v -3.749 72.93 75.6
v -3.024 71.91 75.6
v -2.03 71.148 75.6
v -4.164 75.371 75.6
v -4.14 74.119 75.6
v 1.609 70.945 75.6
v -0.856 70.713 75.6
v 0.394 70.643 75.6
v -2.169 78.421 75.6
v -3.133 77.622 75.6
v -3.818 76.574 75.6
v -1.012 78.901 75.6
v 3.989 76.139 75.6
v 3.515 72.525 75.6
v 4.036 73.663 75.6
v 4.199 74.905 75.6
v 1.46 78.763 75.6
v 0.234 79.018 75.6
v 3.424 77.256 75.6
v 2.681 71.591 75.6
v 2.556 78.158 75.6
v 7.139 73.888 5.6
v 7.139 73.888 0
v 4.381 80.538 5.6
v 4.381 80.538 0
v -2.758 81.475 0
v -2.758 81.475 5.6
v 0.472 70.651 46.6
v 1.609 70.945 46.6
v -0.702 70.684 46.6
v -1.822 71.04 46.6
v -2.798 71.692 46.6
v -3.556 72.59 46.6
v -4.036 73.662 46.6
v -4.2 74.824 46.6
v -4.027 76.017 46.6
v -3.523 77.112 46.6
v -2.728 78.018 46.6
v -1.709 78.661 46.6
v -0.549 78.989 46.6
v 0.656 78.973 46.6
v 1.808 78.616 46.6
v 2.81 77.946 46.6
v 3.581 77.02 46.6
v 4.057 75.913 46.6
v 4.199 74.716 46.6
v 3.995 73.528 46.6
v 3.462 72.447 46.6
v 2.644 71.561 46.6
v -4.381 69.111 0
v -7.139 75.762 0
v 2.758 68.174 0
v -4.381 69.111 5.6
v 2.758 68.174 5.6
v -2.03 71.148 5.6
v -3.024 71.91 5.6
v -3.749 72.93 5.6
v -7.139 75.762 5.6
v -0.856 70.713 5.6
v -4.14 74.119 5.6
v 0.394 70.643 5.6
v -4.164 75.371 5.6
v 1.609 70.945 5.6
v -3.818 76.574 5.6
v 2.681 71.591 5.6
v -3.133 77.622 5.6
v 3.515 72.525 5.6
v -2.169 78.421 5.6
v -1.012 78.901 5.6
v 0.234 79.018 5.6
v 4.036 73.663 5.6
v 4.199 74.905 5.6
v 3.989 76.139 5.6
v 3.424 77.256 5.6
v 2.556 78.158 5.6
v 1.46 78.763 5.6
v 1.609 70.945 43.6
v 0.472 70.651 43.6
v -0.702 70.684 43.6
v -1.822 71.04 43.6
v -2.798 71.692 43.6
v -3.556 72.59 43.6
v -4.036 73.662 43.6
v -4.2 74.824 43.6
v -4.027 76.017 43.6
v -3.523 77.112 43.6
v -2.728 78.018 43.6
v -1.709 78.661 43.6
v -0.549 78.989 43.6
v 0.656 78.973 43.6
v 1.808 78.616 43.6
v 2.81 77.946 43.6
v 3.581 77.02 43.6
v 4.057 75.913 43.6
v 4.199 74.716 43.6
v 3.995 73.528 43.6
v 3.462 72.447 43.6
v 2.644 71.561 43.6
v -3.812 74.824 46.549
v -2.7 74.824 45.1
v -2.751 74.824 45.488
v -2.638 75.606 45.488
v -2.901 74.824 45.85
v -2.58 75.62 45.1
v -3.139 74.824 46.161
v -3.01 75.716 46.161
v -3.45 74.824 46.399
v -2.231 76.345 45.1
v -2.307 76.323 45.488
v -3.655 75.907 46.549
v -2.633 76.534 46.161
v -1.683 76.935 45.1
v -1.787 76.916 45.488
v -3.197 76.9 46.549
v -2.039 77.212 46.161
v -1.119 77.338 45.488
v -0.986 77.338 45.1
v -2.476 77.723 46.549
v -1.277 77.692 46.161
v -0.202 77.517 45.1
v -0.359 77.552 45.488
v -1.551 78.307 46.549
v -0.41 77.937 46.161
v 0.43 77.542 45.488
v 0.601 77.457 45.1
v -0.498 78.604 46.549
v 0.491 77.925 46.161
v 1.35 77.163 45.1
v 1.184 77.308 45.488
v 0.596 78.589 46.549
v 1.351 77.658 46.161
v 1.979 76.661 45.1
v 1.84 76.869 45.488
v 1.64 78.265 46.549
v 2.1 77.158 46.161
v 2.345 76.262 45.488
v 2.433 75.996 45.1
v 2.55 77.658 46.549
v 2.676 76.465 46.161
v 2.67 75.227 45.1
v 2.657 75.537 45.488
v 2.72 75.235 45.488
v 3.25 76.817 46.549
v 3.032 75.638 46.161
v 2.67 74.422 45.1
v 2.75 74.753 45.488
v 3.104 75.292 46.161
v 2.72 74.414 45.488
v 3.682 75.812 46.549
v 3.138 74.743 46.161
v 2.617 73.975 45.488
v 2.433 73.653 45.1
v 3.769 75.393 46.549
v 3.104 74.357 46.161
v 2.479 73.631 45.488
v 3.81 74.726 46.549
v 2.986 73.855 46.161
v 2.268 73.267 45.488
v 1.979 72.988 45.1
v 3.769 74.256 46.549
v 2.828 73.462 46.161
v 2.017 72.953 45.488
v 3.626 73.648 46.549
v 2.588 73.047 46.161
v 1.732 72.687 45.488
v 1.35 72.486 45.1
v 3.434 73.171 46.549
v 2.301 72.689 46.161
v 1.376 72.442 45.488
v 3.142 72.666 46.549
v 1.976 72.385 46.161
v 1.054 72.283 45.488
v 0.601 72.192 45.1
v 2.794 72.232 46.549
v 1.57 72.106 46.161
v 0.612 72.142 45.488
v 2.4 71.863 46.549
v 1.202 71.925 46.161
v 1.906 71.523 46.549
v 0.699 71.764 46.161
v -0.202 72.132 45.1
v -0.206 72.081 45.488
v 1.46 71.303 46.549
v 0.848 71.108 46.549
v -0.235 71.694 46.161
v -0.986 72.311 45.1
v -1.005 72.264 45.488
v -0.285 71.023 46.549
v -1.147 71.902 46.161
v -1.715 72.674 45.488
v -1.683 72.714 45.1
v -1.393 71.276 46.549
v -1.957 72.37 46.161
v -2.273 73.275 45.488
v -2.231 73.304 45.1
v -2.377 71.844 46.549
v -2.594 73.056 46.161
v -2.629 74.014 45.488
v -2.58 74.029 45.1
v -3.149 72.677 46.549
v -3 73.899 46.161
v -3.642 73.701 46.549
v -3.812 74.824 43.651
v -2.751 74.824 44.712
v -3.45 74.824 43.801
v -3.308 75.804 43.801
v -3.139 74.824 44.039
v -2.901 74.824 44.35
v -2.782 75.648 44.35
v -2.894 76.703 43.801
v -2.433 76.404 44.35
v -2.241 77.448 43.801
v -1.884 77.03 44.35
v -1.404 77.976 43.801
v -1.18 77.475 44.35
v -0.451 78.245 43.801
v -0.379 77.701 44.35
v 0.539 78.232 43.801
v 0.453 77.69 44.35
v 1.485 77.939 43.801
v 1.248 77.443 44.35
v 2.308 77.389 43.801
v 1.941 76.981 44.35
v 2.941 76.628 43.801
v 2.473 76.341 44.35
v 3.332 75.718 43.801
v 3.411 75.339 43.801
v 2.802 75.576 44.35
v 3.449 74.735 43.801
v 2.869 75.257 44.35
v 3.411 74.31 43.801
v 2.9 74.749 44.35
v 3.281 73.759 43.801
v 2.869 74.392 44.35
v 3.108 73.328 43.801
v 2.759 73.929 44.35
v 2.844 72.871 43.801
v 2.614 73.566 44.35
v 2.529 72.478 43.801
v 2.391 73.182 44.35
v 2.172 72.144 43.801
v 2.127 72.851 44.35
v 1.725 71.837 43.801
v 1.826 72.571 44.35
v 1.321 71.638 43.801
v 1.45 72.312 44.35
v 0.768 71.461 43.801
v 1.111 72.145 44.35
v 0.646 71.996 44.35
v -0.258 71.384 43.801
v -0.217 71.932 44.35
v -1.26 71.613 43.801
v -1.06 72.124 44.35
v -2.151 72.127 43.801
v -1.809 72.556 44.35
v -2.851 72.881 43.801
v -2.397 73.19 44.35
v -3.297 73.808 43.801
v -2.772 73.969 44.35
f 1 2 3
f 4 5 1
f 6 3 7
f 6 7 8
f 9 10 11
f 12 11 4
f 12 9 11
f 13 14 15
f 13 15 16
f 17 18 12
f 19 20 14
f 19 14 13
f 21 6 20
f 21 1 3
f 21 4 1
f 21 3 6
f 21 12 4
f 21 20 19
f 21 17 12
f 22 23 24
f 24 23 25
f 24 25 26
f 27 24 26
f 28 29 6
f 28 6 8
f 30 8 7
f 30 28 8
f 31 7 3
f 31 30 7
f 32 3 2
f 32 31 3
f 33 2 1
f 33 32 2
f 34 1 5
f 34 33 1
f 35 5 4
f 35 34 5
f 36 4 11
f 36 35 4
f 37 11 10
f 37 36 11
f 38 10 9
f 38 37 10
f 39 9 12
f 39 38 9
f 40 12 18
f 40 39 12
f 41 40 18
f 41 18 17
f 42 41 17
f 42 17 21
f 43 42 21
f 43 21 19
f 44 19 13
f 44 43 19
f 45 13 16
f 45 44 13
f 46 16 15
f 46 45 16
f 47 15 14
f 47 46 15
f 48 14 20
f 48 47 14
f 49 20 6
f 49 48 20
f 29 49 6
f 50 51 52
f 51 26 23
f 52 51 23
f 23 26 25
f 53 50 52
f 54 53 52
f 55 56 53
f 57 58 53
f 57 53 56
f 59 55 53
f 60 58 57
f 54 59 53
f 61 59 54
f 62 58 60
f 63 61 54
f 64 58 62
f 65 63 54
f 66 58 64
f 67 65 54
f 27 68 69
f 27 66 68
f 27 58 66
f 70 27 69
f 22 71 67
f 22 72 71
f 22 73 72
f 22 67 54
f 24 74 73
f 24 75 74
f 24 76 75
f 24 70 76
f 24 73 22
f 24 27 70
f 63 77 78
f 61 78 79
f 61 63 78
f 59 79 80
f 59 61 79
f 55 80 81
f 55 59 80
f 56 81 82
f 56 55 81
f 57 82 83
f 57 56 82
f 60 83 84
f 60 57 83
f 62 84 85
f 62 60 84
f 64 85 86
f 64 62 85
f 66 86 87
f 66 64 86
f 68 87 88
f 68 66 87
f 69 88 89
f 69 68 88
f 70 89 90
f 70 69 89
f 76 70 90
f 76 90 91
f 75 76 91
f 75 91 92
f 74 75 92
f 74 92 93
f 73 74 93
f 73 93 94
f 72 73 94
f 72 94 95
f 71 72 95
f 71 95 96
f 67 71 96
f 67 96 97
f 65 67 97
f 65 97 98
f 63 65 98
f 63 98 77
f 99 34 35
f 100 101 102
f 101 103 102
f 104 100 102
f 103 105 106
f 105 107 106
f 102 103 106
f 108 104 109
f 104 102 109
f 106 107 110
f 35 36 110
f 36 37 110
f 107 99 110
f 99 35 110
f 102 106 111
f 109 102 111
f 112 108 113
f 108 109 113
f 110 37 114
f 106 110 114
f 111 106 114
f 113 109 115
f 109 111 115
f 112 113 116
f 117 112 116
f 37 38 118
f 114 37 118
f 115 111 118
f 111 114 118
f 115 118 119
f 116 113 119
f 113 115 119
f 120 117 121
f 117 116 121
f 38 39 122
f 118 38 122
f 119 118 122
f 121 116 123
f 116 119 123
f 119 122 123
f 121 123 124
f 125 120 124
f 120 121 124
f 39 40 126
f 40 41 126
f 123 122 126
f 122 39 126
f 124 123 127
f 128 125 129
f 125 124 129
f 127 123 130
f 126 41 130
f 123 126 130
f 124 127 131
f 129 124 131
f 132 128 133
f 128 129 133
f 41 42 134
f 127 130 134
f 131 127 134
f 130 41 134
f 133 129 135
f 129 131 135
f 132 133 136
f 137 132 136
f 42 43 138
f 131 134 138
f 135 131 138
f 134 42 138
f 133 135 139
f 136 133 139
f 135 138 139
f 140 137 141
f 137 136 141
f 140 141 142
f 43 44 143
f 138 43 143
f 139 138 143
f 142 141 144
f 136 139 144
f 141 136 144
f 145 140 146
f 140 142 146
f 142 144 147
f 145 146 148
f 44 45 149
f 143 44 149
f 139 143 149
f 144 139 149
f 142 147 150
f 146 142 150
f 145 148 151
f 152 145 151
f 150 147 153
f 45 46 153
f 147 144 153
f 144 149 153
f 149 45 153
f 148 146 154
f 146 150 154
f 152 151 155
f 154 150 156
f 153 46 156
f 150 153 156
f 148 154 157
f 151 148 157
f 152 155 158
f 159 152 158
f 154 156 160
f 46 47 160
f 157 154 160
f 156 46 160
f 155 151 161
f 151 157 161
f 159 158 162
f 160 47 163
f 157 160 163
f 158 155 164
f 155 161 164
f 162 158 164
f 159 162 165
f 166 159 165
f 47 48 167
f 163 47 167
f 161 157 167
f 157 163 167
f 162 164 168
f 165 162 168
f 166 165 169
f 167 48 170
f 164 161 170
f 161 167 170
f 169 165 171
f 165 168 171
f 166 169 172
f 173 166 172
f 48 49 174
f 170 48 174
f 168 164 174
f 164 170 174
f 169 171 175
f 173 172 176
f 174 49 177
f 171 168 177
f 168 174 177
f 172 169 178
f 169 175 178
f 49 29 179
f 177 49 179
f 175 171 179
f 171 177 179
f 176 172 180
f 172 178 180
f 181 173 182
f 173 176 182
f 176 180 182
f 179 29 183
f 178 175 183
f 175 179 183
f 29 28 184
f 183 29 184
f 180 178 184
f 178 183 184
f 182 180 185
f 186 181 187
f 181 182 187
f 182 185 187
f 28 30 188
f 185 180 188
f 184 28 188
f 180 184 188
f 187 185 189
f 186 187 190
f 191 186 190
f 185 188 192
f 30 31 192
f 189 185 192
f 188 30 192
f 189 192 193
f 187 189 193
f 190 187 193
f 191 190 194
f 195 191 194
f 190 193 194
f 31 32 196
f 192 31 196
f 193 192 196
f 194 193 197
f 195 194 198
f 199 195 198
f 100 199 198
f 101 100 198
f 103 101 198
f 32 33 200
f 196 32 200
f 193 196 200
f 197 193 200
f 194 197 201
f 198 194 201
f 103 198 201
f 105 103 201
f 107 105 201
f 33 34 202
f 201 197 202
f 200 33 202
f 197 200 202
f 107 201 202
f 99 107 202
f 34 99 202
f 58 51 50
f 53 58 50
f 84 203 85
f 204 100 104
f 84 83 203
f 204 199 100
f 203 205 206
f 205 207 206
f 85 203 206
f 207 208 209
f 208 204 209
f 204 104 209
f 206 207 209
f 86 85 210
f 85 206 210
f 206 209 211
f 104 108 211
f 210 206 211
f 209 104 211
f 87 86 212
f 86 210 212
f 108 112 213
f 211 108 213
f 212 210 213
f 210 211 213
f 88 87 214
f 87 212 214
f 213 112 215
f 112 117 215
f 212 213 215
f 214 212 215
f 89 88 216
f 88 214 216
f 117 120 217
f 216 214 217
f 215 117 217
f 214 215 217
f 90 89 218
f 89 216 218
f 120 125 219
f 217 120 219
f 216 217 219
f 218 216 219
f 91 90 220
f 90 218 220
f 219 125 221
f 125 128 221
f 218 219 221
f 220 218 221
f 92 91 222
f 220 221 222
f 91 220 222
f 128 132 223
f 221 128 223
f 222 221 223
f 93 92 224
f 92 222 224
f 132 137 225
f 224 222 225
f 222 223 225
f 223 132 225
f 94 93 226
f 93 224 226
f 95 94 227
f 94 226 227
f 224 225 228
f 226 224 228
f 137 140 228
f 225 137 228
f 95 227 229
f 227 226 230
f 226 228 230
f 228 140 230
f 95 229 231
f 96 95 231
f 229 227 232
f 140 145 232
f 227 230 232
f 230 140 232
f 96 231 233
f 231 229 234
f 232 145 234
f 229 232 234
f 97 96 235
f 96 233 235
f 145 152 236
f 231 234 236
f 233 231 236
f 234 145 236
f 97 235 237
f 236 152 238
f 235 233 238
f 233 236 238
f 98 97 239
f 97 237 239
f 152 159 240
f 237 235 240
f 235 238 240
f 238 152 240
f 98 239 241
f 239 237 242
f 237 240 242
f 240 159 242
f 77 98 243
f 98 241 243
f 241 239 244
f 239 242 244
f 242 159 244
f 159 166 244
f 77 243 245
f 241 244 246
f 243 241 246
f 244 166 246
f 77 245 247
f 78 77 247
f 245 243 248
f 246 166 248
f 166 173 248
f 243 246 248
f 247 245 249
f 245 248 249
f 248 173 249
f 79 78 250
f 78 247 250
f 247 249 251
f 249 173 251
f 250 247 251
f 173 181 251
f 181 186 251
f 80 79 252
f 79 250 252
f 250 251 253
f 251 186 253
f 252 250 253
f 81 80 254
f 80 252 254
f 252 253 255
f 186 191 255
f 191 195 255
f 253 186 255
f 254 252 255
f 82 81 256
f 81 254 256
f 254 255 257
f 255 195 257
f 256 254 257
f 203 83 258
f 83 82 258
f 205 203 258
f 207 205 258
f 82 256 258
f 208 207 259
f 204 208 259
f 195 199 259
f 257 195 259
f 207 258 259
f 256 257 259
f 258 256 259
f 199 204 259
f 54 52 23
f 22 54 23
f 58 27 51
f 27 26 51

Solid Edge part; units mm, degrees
sketch "Sketch1" plane through (0, 0, 0) normal (0, 0, 1) x (1, 0, 0)
  line L0 (-2.7579, 81.4753) -> (-7.1387, 75.7615)
  line L1 (-7.1387, 75.7615) -> (-4.3808, 69.1106)
  line L2 (-4.3808, 69.1106) -> (2.7579, 68.1737)
  line L3 (2.7579, 68.1737) -> (7.1387, 73.8875)
  line L4 (7.1387, 73.8875) -> (4.3808, 80.5384)
  line L5 (4.3808, 80.5384) -> (-2.7579, 81.4753)
extrude "Protrusion1" add sketch "Sketch1" along normal up to vertex (5.6 mm away)
sketch "Sketch2" plane through (0, 74.8245, 5.6) normal (0, 0, 1) x (0.383, -0.9237, 0)
  circle A0 centre (0, 0) radius 4.2
extrude "Protrusion2" add sketch "Sketch2" along normal blind 70
sketch "Sketch3" plane through (0, 74.8245, 0) normal (0, -1, 0) x (1, 0, 0)
  circle A0 centre (-4.2, 45.1) radius 1.5
  dimension "D1" = 30.5
revolve "RevolvedCutout1" cut sketch "Sketch3" angle 360 about axis through (0, 74.8245, 54) along (0, 0, -1)
